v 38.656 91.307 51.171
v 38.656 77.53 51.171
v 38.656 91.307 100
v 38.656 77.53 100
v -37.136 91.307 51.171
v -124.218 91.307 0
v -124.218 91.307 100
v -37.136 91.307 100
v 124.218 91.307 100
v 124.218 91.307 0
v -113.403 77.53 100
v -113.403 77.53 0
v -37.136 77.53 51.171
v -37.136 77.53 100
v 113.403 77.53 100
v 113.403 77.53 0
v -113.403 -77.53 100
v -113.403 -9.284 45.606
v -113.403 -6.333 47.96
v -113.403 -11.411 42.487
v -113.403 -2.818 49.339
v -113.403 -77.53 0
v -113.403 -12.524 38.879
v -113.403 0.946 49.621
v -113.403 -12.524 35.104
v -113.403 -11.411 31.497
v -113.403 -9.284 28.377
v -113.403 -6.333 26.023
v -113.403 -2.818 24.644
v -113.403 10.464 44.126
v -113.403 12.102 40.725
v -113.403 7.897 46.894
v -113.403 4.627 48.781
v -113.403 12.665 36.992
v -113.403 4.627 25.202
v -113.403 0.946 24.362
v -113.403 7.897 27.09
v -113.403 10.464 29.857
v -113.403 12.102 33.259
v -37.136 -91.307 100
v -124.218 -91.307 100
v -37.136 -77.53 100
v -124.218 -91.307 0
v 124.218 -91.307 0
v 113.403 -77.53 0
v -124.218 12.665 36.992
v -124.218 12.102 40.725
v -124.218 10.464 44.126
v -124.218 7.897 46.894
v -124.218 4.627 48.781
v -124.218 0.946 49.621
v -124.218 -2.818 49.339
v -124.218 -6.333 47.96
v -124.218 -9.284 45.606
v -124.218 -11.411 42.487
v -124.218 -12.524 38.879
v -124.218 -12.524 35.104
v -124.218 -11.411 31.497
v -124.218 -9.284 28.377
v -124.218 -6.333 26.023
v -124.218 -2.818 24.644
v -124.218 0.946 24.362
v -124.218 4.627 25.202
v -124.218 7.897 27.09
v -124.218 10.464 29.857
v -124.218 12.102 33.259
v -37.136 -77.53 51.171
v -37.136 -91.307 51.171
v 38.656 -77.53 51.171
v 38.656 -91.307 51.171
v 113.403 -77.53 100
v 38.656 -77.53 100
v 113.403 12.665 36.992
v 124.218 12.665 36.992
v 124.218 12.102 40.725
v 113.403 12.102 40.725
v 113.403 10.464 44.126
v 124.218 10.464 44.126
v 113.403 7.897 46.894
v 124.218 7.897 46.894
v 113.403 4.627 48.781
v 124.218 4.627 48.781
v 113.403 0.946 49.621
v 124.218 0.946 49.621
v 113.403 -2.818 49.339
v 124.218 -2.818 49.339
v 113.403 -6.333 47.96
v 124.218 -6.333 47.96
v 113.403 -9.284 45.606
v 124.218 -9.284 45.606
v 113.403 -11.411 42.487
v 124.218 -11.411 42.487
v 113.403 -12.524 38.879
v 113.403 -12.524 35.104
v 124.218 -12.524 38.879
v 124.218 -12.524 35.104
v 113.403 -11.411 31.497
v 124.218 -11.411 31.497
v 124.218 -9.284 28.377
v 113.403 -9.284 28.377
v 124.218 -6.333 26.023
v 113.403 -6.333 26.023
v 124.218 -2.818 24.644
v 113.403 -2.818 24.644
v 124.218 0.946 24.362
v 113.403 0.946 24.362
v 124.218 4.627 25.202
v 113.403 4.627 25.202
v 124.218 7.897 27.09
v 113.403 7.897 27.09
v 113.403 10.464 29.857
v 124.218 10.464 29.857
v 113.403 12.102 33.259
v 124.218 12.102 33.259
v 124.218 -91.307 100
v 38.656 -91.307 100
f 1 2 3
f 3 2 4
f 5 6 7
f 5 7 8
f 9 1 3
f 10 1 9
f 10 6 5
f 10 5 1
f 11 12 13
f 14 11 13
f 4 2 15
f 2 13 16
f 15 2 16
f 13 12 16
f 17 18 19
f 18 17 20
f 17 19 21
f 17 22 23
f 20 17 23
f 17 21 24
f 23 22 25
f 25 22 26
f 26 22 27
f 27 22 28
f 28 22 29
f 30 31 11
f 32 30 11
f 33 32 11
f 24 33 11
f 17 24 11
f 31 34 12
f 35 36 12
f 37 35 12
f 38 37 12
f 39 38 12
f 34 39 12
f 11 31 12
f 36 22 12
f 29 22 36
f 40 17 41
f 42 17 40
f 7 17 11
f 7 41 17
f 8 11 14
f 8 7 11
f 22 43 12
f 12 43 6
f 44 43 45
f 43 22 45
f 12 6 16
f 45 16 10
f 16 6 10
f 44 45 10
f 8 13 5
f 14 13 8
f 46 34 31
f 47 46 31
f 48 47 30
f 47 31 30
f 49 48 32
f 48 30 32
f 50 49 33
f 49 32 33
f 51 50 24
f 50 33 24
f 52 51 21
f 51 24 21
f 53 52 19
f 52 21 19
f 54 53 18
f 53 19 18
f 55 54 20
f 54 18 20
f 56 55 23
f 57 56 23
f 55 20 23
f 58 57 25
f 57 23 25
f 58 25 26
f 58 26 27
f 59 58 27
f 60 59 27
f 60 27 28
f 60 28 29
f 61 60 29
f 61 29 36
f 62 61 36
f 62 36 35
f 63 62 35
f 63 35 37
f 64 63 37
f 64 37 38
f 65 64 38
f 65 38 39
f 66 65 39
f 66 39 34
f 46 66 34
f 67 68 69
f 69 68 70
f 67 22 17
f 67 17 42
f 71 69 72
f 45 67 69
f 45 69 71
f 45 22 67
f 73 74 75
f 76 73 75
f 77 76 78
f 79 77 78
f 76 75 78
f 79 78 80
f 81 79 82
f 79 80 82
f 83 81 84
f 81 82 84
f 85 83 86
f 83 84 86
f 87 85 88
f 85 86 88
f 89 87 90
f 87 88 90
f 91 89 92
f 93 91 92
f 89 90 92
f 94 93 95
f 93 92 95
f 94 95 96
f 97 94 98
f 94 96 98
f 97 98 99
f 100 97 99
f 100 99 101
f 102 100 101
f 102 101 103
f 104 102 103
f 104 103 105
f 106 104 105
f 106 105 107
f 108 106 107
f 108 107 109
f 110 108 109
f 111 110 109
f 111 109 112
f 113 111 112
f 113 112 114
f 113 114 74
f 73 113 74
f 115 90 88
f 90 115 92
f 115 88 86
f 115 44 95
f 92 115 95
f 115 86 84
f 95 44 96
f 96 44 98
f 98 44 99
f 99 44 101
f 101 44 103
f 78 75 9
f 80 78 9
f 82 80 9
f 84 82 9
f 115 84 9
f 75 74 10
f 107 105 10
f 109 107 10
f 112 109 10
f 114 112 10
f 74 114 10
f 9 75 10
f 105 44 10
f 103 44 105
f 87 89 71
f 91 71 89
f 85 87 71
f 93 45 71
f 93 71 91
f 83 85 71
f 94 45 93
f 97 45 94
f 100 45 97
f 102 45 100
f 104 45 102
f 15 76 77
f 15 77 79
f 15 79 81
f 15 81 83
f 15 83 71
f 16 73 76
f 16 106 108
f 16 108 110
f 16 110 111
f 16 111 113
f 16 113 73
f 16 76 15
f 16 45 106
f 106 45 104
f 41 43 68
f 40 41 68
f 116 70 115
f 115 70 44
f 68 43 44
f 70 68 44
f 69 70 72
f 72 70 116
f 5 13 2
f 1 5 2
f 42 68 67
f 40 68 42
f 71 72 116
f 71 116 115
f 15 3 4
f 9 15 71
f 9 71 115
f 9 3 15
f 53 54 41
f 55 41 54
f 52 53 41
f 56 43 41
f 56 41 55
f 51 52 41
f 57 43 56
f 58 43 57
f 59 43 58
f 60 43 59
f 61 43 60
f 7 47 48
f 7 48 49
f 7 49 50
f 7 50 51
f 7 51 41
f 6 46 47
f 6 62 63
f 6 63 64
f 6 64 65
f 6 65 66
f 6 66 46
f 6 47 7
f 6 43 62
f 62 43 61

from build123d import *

# Parameters (mm, degrees)
F0_W     = 248.435066
F0_H     = 182.613314
F0_W_2   = 226.806744
F0_H_2   = 155.059486
F1_DEPTH = 100
F2_W     = 75.79172
F2_H     = 48.828578
F3_DEPTH = 182.614313
F4_R     = 12.665066
F5_DEPTH = 248.436065


with BuildPart() as f1:
    # F0 (on Top) → F1 (new body)
    with BuildSketch(Plane.XY):
        Rectangle(F0_W, F0_H)
        Rectangle(F0_W_2, F0_H_2, mode=Mode.SUBTRACT)
    extrude(amount=F1_DEPTH)

    # F2 (on face) → F3 (cut, through all)
    with BuildSketch(Plane.XZ.offset(91.306657)):
        with Locations((0.759939, 75.585711)):
            Rectangle(F2_W, F2_H)
    extrude(amount=-F3_DEPTH, mode=Mode.SUBTRACT)

    # F4 (on face) → F5 (cut, through all)
    with BuildSketch(Plane.YZ.offset(124.217533)):
        with Locations((0, 36.991738)):
            Circle(F4_R)
    extrude(amount=-F5_DEPTH, mode=Mode.SUBTRACT)


solid = f1.part
